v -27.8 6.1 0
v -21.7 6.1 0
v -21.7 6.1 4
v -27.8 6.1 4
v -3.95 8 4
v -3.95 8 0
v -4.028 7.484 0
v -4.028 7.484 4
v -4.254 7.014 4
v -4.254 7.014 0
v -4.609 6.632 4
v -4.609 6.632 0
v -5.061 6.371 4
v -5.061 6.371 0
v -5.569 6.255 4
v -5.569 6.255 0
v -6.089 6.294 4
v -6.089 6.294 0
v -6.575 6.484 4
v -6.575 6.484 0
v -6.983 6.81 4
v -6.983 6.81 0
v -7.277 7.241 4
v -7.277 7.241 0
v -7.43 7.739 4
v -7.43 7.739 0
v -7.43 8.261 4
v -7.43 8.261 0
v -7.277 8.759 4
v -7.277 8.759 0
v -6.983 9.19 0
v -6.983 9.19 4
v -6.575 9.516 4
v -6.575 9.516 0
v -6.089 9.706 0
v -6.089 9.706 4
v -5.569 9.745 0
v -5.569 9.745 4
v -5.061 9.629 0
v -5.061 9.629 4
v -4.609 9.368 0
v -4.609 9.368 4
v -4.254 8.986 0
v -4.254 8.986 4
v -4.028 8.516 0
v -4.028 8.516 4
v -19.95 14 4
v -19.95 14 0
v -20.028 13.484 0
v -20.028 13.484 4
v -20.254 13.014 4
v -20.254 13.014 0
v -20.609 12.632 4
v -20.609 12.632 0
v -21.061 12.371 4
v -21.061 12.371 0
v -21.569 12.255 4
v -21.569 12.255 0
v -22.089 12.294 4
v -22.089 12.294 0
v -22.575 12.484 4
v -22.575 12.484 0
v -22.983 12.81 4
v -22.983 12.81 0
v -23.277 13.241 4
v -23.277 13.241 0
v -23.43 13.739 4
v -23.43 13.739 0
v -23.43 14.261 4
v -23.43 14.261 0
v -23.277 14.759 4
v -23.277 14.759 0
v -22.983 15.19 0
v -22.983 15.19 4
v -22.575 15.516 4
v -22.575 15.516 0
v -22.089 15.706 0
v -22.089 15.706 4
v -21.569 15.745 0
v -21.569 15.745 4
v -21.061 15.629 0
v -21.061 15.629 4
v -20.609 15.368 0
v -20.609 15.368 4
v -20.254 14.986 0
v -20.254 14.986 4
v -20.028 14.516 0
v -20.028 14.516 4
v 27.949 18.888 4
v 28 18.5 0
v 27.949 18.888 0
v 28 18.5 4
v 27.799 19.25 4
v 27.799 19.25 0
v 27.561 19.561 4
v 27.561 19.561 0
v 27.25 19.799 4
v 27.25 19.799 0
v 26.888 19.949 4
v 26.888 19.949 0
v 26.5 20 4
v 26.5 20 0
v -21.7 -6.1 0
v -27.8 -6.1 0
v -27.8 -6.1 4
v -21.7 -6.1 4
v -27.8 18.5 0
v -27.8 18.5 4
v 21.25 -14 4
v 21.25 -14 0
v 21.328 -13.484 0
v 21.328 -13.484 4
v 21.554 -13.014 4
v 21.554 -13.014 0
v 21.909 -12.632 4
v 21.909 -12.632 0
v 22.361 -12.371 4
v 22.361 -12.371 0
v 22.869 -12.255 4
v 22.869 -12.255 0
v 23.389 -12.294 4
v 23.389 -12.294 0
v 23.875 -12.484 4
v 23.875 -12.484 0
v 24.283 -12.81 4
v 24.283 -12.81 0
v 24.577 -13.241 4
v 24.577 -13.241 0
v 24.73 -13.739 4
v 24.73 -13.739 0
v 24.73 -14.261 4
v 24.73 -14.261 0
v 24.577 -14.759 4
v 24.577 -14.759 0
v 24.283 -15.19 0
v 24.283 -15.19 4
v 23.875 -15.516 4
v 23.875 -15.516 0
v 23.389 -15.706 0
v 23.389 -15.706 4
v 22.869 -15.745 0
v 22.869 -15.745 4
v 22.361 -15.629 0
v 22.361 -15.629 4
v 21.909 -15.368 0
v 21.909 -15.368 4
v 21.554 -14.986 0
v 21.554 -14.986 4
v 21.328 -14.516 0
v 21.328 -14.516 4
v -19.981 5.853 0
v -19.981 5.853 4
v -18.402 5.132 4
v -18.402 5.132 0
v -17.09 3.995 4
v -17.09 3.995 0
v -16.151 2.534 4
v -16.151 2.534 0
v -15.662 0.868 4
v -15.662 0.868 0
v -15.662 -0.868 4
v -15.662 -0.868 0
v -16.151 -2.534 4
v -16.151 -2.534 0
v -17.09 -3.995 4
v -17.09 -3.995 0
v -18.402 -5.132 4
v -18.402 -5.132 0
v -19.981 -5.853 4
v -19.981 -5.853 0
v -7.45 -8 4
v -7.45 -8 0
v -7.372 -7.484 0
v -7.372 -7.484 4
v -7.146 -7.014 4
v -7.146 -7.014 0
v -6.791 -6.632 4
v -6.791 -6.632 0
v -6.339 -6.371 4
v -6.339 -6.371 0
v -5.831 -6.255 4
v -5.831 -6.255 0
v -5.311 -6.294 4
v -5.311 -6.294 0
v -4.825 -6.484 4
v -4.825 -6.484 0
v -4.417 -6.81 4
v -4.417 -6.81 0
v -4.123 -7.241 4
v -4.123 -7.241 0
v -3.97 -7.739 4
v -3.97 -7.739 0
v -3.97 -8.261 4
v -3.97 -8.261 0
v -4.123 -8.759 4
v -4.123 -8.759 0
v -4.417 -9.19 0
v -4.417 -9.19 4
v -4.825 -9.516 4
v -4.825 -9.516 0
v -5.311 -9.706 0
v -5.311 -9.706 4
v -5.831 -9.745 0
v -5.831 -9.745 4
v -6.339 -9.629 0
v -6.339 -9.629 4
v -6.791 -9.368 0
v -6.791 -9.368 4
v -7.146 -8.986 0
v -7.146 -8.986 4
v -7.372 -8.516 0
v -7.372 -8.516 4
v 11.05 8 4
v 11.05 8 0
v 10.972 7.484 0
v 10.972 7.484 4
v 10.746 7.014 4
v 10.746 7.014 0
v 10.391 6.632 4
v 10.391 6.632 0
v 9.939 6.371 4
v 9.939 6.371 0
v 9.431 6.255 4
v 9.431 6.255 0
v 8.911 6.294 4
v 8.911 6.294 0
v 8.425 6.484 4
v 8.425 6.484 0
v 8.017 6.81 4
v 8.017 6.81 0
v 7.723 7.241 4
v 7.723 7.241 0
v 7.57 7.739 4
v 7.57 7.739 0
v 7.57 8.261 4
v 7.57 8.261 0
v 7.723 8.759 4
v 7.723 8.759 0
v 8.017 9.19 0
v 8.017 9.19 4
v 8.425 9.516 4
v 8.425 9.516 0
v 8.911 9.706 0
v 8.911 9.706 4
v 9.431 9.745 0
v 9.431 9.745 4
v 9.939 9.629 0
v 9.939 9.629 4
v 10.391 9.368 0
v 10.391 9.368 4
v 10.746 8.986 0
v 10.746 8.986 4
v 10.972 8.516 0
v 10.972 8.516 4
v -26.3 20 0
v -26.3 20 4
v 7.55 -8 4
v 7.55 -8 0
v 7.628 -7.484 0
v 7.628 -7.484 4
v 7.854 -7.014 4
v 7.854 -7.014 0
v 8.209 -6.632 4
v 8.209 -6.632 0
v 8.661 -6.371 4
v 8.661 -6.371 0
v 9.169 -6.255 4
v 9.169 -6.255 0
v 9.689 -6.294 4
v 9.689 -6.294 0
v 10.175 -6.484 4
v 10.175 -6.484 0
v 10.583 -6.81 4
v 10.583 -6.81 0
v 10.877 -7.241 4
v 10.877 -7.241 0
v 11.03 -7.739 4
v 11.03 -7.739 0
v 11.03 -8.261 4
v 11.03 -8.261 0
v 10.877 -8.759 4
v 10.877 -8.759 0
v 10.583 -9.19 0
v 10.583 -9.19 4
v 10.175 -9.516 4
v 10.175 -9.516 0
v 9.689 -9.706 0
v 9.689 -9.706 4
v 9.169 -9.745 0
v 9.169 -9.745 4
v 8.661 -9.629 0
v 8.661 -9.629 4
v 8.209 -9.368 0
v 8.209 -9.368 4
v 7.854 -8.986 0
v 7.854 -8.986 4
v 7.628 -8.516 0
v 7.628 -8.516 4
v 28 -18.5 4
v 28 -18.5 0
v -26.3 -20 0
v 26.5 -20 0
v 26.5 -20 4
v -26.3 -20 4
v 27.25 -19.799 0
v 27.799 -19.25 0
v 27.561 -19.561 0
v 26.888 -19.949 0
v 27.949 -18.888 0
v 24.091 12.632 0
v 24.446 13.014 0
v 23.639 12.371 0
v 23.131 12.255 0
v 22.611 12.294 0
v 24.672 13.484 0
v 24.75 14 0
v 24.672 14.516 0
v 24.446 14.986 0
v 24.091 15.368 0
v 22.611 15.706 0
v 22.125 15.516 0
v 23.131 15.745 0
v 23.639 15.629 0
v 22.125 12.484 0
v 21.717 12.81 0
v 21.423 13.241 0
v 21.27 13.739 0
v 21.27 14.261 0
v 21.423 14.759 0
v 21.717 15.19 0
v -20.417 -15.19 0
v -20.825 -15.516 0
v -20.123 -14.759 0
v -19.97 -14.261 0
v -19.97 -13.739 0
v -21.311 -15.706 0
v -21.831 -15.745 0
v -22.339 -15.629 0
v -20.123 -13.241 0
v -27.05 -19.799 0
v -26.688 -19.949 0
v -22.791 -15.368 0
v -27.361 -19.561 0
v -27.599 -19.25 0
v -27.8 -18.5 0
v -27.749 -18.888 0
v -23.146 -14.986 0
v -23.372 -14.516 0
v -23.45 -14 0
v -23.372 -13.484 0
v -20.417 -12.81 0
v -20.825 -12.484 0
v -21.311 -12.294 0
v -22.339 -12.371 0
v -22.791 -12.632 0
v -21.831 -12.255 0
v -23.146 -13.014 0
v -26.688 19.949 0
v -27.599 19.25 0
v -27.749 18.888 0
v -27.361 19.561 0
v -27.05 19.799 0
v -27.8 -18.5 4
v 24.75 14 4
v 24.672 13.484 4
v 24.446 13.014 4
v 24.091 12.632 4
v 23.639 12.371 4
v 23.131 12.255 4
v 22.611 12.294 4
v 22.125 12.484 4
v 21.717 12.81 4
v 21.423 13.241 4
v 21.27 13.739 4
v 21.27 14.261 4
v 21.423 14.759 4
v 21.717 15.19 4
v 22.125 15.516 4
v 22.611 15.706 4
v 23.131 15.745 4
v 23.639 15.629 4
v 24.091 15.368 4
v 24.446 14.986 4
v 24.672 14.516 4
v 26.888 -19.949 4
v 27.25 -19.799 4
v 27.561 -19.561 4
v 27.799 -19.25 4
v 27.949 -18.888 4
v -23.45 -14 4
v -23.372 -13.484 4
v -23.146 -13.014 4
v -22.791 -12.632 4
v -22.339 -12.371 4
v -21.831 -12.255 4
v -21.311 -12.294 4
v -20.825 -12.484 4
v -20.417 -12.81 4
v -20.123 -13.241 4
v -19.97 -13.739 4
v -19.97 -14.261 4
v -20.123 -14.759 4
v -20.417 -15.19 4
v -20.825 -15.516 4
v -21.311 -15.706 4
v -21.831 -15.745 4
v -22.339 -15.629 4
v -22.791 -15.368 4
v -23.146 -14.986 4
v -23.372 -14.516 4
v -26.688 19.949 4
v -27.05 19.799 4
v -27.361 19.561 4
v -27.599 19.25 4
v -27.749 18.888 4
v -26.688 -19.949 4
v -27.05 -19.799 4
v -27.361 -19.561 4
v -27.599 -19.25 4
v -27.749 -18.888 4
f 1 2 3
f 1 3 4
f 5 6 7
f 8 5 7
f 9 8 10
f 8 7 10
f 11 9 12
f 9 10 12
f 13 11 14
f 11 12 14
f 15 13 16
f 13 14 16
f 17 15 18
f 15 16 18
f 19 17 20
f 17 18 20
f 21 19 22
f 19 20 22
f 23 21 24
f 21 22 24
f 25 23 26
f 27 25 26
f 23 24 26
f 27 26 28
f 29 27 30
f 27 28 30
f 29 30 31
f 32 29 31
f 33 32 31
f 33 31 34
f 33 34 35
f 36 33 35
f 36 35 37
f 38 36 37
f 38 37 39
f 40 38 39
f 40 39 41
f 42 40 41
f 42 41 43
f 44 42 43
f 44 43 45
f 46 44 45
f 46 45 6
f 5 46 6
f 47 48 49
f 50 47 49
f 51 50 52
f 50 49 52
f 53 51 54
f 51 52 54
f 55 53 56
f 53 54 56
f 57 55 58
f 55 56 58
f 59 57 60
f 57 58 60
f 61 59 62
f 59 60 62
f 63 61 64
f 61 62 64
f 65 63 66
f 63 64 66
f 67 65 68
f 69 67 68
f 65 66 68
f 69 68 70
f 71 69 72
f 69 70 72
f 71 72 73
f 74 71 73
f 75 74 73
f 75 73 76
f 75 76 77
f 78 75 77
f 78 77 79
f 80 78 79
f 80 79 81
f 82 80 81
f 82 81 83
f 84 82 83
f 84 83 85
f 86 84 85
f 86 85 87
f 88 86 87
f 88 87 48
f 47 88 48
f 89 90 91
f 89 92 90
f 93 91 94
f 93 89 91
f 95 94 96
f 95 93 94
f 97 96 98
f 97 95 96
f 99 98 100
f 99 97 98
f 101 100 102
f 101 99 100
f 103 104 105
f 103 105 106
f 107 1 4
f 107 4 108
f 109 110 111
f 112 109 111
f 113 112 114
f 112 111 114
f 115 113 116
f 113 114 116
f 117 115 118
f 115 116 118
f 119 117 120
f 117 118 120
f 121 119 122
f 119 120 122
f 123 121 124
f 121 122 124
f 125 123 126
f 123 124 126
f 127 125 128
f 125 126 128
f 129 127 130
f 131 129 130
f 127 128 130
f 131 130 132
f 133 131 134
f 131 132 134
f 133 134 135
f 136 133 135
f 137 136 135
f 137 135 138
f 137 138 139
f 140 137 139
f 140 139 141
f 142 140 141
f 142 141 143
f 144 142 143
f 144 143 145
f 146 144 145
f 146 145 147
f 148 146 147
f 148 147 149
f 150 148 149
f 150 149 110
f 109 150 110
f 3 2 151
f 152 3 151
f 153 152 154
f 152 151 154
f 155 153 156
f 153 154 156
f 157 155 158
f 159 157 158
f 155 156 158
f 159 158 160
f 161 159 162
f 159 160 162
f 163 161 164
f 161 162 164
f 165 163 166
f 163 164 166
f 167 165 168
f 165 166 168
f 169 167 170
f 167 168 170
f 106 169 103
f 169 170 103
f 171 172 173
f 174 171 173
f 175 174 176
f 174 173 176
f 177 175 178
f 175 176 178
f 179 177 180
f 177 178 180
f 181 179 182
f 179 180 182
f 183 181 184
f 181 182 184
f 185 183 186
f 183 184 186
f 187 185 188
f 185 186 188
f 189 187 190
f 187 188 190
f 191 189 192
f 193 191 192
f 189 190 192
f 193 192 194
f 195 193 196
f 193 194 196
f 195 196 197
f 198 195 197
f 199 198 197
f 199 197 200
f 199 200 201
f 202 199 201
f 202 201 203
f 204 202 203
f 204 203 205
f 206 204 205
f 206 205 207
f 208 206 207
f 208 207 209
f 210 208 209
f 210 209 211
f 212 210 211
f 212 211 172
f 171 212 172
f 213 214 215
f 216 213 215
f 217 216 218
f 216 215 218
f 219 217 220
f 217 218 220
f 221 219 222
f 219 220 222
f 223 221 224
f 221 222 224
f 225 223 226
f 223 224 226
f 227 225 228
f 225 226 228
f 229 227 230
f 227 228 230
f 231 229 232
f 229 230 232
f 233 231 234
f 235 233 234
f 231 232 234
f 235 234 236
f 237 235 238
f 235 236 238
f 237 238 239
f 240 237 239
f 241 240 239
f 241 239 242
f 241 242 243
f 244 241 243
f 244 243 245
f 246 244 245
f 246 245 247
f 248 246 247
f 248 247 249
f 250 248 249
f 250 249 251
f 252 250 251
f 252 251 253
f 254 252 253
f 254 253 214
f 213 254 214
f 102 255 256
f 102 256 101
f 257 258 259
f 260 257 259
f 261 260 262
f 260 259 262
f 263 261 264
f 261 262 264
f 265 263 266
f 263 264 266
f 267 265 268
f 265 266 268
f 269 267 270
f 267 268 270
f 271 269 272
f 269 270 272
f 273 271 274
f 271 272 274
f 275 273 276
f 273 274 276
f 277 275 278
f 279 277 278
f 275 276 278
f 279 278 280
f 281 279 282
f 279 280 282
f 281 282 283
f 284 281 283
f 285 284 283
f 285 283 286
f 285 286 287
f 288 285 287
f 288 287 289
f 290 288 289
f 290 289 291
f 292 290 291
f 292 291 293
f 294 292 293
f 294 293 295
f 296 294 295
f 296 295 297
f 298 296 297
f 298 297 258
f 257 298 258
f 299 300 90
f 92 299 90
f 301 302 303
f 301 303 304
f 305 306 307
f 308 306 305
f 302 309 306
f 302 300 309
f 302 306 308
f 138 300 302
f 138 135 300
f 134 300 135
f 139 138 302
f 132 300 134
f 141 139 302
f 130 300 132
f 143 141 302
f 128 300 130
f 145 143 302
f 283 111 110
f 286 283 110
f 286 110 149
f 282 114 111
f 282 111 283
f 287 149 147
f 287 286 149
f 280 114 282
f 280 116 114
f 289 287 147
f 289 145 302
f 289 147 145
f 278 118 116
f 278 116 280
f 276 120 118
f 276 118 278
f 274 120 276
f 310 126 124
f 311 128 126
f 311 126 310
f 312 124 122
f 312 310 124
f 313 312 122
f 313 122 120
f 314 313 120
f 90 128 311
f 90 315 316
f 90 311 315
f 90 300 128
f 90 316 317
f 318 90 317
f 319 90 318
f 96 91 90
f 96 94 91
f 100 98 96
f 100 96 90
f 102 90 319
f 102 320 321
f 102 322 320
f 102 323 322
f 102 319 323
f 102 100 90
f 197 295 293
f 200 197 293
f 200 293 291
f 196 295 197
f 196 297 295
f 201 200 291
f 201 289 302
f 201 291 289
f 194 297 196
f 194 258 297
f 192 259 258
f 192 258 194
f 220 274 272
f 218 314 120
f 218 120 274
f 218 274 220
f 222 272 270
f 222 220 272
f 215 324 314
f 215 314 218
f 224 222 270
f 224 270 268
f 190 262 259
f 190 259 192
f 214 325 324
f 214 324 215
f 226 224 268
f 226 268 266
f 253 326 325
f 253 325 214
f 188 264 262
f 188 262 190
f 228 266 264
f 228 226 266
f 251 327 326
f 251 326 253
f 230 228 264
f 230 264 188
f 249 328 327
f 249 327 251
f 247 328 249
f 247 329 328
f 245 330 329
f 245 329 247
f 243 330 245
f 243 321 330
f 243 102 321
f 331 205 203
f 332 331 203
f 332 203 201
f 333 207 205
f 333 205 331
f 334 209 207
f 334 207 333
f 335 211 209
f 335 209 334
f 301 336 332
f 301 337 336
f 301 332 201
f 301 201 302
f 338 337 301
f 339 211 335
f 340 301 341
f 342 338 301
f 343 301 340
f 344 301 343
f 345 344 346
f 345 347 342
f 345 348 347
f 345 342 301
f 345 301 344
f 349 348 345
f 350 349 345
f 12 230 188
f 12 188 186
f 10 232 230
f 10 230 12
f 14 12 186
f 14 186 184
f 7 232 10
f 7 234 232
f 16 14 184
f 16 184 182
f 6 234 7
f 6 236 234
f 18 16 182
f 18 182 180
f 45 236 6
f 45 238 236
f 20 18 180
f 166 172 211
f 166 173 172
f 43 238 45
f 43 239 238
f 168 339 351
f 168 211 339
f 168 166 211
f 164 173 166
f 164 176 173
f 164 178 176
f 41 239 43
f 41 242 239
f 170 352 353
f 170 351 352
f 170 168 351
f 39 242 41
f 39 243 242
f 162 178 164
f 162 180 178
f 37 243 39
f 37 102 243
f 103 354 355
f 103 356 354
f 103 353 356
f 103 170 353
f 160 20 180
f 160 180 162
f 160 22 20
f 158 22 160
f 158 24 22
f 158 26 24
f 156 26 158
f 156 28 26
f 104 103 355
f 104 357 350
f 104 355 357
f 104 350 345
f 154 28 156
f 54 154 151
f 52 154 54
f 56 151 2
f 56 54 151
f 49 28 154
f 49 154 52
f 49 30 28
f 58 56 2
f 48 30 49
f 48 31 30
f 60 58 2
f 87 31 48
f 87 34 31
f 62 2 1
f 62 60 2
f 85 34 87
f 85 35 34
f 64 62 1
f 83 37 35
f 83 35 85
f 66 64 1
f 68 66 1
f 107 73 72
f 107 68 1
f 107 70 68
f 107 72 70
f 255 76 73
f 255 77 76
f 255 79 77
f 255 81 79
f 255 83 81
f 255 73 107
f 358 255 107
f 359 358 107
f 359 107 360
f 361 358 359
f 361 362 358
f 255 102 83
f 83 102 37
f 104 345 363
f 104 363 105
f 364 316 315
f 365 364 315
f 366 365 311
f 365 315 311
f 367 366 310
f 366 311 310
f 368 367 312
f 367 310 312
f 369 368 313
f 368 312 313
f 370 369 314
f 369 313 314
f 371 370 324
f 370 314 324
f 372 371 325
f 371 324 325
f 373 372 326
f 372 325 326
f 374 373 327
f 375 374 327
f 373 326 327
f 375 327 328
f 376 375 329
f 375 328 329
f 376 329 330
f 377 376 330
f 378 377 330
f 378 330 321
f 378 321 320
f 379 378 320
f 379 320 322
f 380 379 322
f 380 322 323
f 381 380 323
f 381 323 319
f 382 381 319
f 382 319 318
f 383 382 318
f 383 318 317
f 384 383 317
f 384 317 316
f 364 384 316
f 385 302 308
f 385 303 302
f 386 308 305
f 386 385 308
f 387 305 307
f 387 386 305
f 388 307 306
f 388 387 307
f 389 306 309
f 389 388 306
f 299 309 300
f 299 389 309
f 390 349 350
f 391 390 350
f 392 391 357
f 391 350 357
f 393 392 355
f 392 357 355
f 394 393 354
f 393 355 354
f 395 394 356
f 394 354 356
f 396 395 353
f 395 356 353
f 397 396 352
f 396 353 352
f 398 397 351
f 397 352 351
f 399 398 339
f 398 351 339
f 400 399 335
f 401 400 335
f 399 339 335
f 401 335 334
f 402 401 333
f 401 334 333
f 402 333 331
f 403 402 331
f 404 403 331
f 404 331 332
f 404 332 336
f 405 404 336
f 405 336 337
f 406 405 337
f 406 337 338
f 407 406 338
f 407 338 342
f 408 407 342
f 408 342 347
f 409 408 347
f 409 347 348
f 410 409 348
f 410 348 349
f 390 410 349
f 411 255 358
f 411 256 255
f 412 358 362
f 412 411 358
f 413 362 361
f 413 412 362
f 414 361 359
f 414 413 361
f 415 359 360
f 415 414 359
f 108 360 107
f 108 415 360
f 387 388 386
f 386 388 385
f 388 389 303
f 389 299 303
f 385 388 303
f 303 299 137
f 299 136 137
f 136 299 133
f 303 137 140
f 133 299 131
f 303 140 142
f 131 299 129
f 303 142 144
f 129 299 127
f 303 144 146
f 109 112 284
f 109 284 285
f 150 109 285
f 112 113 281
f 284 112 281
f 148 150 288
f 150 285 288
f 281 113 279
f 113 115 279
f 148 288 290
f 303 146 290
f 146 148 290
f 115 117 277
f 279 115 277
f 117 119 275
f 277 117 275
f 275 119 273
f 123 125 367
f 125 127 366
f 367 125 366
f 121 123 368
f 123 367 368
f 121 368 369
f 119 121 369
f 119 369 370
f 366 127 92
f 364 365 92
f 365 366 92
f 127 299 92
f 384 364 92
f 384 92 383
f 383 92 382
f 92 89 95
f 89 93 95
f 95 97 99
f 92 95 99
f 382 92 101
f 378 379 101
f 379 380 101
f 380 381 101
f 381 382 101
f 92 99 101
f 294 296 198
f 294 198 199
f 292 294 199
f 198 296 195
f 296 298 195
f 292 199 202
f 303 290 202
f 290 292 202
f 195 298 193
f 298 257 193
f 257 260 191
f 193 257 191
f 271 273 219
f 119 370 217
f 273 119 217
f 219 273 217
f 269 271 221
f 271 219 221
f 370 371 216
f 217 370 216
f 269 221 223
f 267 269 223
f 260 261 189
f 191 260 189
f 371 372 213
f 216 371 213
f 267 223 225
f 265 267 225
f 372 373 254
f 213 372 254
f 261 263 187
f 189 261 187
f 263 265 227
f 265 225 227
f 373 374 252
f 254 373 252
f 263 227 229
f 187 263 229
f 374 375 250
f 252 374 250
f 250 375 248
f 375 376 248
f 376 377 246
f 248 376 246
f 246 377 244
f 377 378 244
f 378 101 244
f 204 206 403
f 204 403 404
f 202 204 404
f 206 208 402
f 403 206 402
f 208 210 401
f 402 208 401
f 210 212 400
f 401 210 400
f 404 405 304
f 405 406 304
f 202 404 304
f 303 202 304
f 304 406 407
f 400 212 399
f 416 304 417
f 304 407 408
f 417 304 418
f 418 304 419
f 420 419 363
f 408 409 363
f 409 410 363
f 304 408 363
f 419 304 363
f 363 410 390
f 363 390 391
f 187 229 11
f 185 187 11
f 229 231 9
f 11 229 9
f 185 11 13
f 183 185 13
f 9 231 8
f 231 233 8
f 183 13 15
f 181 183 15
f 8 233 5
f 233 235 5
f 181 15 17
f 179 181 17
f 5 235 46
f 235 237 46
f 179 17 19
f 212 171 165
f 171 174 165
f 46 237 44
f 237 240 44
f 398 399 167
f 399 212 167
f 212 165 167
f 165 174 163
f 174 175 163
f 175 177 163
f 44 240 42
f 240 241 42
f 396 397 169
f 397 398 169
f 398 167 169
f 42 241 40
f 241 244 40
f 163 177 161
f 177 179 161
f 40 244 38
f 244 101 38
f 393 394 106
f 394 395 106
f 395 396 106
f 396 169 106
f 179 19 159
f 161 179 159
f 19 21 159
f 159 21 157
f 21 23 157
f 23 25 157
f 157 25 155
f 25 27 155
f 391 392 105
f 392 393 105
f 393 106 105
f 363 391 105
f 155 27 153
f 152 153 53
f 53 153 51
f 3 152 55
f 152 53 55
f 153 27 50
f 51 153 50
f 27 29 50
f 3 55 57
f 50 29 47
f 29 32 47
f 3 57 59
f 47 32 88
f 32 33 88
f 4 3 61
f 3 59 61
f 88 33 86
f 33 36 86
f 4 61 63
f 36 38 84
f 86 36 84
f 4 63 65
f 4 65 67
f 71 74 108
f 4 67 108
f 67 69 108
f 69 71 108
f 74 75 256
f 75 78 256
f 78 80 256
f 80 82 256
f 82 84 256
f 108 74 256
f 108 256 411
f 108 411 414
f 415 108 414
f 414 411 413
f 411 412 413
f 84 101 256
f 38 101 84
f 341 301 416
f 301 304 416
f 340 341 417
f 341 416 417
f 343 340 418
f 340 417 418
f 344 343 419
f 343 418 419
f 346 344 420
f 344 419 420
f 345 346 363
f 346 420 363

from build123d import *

# Parameters (mm, degrees)
EXTRUDE_2_DEPTH     = 4
SKETCH_4_R          = 6.1
SKETCH_4_R_2        = 1.75
CUT_EXTRUDE_1_DEPTH = 39.794329483
SKETCH_5_W          = 5
SKETCH_5_H          = 40
CUT_EXTRUDE_2_DEPTH = 4
FILLET_1_R          = 1.5


with BuildPart() as part:
    # Эскиз1 → Бобышка-Вытянуть2 (new body)
    with BuildSketch(Plane.XY):
        with BuildLine():
            Line((31.5, -20), (-31.5, -20))
            ThreePointArc((-31.5, -20), (-32.560660172, -19.560660172), (-33, -18.5))
            Line((-33, -18.5), (-33, 18.5))
            ThreePointArc((-33, 18.5), (-32.560660172, 19.560660172), (-31.5, 20))
            Line((-31.5, 20), (31.5, 20))
            ThreePointArc((31.5, 20), (32.560660172, 19.560660172), (33, 18.5))
            Line((33, 18.5), (33, -18.5))
            ThreePointArc((33, -18.5), (32.560660172, -19.560660172), (31.5, -20))
        make_face()
    extrude(amount=EXTRUDE_2_DEPTH)

    # Эскиз4 → Вырез-Вытянуть1 (cut, through all)
    with BuildSketch(Plane(origin=(0, 0, 0), x_dir=(-1, 0, 0), z_dir=(0, 0, -1))):
        with Locations((21.7, 0)):
            Circle(SKETCH_4_R)
        with Locations((21.7, -14)):
            Circle(SKETCH_4_R_2)
        with Locations((5.7, -8)):
            Circle(SKETCH_4_R_2)
        with Locations((-9.3, -8)):
            Circle(SKETCH_4_R_2)
        with Locations((-23, -14)):
            Circle(SKETCH_4_R_2)
        with Locations(Location((21.7, 14, 0), (0, 0, 180))):
            Circle(SKETCH_4_R_2)
        with Locations(Location((5.7, 8, 0), (0, 0, 180))):
            Circle(SKETCH_4_R_2)
        with Locations(Location((-9.3, 8, 0), (0, 0, 180))):
            Circle(SKETCH_4_R_2)
        with Locations(Location((-23, 14, 0), (0, 0, 180))):
            Circle(SKETCH_4_R_2)
    extrude(amount=-CUT_EXTRUDE_1_DEPTH, mode=Mode.SUBTRACT)

    # Эскиз5 → Вырез-Вытянуть2 (cut)
    with BuildSketch(Plane(origin=(0, 0, 0), x_dir=(-1, 0, 0), z_dir=(0, 0, -1))):
        Polygon((27.8, 20), (33, 20), (33, -20), (27.8, -20), (27.8, -6.1), (21.7, -6.1), (21.7, 6.1), (27.8, 6.1), align=None)
        with Locations((-30.5, 0)):
            Rectangle(SKETCH_5_W, SKETCH_5_H)
    extrude(amount=-CUT_EXTRUDE_2_DEPTH, mode=Mode.SUBTRACT)

    # Скругление1
    fillet_1_edges = [part.edges().sort_by_distance(p)[0] for p in [
        (28, 20, 2),
        (28, -20, 2),
        (-27.8, 20, 2),
        (-27.8, -20, 2),
    ]]
    fillet(fillet_1_edges, radius=FILLET_1_R)


solid = part.part
